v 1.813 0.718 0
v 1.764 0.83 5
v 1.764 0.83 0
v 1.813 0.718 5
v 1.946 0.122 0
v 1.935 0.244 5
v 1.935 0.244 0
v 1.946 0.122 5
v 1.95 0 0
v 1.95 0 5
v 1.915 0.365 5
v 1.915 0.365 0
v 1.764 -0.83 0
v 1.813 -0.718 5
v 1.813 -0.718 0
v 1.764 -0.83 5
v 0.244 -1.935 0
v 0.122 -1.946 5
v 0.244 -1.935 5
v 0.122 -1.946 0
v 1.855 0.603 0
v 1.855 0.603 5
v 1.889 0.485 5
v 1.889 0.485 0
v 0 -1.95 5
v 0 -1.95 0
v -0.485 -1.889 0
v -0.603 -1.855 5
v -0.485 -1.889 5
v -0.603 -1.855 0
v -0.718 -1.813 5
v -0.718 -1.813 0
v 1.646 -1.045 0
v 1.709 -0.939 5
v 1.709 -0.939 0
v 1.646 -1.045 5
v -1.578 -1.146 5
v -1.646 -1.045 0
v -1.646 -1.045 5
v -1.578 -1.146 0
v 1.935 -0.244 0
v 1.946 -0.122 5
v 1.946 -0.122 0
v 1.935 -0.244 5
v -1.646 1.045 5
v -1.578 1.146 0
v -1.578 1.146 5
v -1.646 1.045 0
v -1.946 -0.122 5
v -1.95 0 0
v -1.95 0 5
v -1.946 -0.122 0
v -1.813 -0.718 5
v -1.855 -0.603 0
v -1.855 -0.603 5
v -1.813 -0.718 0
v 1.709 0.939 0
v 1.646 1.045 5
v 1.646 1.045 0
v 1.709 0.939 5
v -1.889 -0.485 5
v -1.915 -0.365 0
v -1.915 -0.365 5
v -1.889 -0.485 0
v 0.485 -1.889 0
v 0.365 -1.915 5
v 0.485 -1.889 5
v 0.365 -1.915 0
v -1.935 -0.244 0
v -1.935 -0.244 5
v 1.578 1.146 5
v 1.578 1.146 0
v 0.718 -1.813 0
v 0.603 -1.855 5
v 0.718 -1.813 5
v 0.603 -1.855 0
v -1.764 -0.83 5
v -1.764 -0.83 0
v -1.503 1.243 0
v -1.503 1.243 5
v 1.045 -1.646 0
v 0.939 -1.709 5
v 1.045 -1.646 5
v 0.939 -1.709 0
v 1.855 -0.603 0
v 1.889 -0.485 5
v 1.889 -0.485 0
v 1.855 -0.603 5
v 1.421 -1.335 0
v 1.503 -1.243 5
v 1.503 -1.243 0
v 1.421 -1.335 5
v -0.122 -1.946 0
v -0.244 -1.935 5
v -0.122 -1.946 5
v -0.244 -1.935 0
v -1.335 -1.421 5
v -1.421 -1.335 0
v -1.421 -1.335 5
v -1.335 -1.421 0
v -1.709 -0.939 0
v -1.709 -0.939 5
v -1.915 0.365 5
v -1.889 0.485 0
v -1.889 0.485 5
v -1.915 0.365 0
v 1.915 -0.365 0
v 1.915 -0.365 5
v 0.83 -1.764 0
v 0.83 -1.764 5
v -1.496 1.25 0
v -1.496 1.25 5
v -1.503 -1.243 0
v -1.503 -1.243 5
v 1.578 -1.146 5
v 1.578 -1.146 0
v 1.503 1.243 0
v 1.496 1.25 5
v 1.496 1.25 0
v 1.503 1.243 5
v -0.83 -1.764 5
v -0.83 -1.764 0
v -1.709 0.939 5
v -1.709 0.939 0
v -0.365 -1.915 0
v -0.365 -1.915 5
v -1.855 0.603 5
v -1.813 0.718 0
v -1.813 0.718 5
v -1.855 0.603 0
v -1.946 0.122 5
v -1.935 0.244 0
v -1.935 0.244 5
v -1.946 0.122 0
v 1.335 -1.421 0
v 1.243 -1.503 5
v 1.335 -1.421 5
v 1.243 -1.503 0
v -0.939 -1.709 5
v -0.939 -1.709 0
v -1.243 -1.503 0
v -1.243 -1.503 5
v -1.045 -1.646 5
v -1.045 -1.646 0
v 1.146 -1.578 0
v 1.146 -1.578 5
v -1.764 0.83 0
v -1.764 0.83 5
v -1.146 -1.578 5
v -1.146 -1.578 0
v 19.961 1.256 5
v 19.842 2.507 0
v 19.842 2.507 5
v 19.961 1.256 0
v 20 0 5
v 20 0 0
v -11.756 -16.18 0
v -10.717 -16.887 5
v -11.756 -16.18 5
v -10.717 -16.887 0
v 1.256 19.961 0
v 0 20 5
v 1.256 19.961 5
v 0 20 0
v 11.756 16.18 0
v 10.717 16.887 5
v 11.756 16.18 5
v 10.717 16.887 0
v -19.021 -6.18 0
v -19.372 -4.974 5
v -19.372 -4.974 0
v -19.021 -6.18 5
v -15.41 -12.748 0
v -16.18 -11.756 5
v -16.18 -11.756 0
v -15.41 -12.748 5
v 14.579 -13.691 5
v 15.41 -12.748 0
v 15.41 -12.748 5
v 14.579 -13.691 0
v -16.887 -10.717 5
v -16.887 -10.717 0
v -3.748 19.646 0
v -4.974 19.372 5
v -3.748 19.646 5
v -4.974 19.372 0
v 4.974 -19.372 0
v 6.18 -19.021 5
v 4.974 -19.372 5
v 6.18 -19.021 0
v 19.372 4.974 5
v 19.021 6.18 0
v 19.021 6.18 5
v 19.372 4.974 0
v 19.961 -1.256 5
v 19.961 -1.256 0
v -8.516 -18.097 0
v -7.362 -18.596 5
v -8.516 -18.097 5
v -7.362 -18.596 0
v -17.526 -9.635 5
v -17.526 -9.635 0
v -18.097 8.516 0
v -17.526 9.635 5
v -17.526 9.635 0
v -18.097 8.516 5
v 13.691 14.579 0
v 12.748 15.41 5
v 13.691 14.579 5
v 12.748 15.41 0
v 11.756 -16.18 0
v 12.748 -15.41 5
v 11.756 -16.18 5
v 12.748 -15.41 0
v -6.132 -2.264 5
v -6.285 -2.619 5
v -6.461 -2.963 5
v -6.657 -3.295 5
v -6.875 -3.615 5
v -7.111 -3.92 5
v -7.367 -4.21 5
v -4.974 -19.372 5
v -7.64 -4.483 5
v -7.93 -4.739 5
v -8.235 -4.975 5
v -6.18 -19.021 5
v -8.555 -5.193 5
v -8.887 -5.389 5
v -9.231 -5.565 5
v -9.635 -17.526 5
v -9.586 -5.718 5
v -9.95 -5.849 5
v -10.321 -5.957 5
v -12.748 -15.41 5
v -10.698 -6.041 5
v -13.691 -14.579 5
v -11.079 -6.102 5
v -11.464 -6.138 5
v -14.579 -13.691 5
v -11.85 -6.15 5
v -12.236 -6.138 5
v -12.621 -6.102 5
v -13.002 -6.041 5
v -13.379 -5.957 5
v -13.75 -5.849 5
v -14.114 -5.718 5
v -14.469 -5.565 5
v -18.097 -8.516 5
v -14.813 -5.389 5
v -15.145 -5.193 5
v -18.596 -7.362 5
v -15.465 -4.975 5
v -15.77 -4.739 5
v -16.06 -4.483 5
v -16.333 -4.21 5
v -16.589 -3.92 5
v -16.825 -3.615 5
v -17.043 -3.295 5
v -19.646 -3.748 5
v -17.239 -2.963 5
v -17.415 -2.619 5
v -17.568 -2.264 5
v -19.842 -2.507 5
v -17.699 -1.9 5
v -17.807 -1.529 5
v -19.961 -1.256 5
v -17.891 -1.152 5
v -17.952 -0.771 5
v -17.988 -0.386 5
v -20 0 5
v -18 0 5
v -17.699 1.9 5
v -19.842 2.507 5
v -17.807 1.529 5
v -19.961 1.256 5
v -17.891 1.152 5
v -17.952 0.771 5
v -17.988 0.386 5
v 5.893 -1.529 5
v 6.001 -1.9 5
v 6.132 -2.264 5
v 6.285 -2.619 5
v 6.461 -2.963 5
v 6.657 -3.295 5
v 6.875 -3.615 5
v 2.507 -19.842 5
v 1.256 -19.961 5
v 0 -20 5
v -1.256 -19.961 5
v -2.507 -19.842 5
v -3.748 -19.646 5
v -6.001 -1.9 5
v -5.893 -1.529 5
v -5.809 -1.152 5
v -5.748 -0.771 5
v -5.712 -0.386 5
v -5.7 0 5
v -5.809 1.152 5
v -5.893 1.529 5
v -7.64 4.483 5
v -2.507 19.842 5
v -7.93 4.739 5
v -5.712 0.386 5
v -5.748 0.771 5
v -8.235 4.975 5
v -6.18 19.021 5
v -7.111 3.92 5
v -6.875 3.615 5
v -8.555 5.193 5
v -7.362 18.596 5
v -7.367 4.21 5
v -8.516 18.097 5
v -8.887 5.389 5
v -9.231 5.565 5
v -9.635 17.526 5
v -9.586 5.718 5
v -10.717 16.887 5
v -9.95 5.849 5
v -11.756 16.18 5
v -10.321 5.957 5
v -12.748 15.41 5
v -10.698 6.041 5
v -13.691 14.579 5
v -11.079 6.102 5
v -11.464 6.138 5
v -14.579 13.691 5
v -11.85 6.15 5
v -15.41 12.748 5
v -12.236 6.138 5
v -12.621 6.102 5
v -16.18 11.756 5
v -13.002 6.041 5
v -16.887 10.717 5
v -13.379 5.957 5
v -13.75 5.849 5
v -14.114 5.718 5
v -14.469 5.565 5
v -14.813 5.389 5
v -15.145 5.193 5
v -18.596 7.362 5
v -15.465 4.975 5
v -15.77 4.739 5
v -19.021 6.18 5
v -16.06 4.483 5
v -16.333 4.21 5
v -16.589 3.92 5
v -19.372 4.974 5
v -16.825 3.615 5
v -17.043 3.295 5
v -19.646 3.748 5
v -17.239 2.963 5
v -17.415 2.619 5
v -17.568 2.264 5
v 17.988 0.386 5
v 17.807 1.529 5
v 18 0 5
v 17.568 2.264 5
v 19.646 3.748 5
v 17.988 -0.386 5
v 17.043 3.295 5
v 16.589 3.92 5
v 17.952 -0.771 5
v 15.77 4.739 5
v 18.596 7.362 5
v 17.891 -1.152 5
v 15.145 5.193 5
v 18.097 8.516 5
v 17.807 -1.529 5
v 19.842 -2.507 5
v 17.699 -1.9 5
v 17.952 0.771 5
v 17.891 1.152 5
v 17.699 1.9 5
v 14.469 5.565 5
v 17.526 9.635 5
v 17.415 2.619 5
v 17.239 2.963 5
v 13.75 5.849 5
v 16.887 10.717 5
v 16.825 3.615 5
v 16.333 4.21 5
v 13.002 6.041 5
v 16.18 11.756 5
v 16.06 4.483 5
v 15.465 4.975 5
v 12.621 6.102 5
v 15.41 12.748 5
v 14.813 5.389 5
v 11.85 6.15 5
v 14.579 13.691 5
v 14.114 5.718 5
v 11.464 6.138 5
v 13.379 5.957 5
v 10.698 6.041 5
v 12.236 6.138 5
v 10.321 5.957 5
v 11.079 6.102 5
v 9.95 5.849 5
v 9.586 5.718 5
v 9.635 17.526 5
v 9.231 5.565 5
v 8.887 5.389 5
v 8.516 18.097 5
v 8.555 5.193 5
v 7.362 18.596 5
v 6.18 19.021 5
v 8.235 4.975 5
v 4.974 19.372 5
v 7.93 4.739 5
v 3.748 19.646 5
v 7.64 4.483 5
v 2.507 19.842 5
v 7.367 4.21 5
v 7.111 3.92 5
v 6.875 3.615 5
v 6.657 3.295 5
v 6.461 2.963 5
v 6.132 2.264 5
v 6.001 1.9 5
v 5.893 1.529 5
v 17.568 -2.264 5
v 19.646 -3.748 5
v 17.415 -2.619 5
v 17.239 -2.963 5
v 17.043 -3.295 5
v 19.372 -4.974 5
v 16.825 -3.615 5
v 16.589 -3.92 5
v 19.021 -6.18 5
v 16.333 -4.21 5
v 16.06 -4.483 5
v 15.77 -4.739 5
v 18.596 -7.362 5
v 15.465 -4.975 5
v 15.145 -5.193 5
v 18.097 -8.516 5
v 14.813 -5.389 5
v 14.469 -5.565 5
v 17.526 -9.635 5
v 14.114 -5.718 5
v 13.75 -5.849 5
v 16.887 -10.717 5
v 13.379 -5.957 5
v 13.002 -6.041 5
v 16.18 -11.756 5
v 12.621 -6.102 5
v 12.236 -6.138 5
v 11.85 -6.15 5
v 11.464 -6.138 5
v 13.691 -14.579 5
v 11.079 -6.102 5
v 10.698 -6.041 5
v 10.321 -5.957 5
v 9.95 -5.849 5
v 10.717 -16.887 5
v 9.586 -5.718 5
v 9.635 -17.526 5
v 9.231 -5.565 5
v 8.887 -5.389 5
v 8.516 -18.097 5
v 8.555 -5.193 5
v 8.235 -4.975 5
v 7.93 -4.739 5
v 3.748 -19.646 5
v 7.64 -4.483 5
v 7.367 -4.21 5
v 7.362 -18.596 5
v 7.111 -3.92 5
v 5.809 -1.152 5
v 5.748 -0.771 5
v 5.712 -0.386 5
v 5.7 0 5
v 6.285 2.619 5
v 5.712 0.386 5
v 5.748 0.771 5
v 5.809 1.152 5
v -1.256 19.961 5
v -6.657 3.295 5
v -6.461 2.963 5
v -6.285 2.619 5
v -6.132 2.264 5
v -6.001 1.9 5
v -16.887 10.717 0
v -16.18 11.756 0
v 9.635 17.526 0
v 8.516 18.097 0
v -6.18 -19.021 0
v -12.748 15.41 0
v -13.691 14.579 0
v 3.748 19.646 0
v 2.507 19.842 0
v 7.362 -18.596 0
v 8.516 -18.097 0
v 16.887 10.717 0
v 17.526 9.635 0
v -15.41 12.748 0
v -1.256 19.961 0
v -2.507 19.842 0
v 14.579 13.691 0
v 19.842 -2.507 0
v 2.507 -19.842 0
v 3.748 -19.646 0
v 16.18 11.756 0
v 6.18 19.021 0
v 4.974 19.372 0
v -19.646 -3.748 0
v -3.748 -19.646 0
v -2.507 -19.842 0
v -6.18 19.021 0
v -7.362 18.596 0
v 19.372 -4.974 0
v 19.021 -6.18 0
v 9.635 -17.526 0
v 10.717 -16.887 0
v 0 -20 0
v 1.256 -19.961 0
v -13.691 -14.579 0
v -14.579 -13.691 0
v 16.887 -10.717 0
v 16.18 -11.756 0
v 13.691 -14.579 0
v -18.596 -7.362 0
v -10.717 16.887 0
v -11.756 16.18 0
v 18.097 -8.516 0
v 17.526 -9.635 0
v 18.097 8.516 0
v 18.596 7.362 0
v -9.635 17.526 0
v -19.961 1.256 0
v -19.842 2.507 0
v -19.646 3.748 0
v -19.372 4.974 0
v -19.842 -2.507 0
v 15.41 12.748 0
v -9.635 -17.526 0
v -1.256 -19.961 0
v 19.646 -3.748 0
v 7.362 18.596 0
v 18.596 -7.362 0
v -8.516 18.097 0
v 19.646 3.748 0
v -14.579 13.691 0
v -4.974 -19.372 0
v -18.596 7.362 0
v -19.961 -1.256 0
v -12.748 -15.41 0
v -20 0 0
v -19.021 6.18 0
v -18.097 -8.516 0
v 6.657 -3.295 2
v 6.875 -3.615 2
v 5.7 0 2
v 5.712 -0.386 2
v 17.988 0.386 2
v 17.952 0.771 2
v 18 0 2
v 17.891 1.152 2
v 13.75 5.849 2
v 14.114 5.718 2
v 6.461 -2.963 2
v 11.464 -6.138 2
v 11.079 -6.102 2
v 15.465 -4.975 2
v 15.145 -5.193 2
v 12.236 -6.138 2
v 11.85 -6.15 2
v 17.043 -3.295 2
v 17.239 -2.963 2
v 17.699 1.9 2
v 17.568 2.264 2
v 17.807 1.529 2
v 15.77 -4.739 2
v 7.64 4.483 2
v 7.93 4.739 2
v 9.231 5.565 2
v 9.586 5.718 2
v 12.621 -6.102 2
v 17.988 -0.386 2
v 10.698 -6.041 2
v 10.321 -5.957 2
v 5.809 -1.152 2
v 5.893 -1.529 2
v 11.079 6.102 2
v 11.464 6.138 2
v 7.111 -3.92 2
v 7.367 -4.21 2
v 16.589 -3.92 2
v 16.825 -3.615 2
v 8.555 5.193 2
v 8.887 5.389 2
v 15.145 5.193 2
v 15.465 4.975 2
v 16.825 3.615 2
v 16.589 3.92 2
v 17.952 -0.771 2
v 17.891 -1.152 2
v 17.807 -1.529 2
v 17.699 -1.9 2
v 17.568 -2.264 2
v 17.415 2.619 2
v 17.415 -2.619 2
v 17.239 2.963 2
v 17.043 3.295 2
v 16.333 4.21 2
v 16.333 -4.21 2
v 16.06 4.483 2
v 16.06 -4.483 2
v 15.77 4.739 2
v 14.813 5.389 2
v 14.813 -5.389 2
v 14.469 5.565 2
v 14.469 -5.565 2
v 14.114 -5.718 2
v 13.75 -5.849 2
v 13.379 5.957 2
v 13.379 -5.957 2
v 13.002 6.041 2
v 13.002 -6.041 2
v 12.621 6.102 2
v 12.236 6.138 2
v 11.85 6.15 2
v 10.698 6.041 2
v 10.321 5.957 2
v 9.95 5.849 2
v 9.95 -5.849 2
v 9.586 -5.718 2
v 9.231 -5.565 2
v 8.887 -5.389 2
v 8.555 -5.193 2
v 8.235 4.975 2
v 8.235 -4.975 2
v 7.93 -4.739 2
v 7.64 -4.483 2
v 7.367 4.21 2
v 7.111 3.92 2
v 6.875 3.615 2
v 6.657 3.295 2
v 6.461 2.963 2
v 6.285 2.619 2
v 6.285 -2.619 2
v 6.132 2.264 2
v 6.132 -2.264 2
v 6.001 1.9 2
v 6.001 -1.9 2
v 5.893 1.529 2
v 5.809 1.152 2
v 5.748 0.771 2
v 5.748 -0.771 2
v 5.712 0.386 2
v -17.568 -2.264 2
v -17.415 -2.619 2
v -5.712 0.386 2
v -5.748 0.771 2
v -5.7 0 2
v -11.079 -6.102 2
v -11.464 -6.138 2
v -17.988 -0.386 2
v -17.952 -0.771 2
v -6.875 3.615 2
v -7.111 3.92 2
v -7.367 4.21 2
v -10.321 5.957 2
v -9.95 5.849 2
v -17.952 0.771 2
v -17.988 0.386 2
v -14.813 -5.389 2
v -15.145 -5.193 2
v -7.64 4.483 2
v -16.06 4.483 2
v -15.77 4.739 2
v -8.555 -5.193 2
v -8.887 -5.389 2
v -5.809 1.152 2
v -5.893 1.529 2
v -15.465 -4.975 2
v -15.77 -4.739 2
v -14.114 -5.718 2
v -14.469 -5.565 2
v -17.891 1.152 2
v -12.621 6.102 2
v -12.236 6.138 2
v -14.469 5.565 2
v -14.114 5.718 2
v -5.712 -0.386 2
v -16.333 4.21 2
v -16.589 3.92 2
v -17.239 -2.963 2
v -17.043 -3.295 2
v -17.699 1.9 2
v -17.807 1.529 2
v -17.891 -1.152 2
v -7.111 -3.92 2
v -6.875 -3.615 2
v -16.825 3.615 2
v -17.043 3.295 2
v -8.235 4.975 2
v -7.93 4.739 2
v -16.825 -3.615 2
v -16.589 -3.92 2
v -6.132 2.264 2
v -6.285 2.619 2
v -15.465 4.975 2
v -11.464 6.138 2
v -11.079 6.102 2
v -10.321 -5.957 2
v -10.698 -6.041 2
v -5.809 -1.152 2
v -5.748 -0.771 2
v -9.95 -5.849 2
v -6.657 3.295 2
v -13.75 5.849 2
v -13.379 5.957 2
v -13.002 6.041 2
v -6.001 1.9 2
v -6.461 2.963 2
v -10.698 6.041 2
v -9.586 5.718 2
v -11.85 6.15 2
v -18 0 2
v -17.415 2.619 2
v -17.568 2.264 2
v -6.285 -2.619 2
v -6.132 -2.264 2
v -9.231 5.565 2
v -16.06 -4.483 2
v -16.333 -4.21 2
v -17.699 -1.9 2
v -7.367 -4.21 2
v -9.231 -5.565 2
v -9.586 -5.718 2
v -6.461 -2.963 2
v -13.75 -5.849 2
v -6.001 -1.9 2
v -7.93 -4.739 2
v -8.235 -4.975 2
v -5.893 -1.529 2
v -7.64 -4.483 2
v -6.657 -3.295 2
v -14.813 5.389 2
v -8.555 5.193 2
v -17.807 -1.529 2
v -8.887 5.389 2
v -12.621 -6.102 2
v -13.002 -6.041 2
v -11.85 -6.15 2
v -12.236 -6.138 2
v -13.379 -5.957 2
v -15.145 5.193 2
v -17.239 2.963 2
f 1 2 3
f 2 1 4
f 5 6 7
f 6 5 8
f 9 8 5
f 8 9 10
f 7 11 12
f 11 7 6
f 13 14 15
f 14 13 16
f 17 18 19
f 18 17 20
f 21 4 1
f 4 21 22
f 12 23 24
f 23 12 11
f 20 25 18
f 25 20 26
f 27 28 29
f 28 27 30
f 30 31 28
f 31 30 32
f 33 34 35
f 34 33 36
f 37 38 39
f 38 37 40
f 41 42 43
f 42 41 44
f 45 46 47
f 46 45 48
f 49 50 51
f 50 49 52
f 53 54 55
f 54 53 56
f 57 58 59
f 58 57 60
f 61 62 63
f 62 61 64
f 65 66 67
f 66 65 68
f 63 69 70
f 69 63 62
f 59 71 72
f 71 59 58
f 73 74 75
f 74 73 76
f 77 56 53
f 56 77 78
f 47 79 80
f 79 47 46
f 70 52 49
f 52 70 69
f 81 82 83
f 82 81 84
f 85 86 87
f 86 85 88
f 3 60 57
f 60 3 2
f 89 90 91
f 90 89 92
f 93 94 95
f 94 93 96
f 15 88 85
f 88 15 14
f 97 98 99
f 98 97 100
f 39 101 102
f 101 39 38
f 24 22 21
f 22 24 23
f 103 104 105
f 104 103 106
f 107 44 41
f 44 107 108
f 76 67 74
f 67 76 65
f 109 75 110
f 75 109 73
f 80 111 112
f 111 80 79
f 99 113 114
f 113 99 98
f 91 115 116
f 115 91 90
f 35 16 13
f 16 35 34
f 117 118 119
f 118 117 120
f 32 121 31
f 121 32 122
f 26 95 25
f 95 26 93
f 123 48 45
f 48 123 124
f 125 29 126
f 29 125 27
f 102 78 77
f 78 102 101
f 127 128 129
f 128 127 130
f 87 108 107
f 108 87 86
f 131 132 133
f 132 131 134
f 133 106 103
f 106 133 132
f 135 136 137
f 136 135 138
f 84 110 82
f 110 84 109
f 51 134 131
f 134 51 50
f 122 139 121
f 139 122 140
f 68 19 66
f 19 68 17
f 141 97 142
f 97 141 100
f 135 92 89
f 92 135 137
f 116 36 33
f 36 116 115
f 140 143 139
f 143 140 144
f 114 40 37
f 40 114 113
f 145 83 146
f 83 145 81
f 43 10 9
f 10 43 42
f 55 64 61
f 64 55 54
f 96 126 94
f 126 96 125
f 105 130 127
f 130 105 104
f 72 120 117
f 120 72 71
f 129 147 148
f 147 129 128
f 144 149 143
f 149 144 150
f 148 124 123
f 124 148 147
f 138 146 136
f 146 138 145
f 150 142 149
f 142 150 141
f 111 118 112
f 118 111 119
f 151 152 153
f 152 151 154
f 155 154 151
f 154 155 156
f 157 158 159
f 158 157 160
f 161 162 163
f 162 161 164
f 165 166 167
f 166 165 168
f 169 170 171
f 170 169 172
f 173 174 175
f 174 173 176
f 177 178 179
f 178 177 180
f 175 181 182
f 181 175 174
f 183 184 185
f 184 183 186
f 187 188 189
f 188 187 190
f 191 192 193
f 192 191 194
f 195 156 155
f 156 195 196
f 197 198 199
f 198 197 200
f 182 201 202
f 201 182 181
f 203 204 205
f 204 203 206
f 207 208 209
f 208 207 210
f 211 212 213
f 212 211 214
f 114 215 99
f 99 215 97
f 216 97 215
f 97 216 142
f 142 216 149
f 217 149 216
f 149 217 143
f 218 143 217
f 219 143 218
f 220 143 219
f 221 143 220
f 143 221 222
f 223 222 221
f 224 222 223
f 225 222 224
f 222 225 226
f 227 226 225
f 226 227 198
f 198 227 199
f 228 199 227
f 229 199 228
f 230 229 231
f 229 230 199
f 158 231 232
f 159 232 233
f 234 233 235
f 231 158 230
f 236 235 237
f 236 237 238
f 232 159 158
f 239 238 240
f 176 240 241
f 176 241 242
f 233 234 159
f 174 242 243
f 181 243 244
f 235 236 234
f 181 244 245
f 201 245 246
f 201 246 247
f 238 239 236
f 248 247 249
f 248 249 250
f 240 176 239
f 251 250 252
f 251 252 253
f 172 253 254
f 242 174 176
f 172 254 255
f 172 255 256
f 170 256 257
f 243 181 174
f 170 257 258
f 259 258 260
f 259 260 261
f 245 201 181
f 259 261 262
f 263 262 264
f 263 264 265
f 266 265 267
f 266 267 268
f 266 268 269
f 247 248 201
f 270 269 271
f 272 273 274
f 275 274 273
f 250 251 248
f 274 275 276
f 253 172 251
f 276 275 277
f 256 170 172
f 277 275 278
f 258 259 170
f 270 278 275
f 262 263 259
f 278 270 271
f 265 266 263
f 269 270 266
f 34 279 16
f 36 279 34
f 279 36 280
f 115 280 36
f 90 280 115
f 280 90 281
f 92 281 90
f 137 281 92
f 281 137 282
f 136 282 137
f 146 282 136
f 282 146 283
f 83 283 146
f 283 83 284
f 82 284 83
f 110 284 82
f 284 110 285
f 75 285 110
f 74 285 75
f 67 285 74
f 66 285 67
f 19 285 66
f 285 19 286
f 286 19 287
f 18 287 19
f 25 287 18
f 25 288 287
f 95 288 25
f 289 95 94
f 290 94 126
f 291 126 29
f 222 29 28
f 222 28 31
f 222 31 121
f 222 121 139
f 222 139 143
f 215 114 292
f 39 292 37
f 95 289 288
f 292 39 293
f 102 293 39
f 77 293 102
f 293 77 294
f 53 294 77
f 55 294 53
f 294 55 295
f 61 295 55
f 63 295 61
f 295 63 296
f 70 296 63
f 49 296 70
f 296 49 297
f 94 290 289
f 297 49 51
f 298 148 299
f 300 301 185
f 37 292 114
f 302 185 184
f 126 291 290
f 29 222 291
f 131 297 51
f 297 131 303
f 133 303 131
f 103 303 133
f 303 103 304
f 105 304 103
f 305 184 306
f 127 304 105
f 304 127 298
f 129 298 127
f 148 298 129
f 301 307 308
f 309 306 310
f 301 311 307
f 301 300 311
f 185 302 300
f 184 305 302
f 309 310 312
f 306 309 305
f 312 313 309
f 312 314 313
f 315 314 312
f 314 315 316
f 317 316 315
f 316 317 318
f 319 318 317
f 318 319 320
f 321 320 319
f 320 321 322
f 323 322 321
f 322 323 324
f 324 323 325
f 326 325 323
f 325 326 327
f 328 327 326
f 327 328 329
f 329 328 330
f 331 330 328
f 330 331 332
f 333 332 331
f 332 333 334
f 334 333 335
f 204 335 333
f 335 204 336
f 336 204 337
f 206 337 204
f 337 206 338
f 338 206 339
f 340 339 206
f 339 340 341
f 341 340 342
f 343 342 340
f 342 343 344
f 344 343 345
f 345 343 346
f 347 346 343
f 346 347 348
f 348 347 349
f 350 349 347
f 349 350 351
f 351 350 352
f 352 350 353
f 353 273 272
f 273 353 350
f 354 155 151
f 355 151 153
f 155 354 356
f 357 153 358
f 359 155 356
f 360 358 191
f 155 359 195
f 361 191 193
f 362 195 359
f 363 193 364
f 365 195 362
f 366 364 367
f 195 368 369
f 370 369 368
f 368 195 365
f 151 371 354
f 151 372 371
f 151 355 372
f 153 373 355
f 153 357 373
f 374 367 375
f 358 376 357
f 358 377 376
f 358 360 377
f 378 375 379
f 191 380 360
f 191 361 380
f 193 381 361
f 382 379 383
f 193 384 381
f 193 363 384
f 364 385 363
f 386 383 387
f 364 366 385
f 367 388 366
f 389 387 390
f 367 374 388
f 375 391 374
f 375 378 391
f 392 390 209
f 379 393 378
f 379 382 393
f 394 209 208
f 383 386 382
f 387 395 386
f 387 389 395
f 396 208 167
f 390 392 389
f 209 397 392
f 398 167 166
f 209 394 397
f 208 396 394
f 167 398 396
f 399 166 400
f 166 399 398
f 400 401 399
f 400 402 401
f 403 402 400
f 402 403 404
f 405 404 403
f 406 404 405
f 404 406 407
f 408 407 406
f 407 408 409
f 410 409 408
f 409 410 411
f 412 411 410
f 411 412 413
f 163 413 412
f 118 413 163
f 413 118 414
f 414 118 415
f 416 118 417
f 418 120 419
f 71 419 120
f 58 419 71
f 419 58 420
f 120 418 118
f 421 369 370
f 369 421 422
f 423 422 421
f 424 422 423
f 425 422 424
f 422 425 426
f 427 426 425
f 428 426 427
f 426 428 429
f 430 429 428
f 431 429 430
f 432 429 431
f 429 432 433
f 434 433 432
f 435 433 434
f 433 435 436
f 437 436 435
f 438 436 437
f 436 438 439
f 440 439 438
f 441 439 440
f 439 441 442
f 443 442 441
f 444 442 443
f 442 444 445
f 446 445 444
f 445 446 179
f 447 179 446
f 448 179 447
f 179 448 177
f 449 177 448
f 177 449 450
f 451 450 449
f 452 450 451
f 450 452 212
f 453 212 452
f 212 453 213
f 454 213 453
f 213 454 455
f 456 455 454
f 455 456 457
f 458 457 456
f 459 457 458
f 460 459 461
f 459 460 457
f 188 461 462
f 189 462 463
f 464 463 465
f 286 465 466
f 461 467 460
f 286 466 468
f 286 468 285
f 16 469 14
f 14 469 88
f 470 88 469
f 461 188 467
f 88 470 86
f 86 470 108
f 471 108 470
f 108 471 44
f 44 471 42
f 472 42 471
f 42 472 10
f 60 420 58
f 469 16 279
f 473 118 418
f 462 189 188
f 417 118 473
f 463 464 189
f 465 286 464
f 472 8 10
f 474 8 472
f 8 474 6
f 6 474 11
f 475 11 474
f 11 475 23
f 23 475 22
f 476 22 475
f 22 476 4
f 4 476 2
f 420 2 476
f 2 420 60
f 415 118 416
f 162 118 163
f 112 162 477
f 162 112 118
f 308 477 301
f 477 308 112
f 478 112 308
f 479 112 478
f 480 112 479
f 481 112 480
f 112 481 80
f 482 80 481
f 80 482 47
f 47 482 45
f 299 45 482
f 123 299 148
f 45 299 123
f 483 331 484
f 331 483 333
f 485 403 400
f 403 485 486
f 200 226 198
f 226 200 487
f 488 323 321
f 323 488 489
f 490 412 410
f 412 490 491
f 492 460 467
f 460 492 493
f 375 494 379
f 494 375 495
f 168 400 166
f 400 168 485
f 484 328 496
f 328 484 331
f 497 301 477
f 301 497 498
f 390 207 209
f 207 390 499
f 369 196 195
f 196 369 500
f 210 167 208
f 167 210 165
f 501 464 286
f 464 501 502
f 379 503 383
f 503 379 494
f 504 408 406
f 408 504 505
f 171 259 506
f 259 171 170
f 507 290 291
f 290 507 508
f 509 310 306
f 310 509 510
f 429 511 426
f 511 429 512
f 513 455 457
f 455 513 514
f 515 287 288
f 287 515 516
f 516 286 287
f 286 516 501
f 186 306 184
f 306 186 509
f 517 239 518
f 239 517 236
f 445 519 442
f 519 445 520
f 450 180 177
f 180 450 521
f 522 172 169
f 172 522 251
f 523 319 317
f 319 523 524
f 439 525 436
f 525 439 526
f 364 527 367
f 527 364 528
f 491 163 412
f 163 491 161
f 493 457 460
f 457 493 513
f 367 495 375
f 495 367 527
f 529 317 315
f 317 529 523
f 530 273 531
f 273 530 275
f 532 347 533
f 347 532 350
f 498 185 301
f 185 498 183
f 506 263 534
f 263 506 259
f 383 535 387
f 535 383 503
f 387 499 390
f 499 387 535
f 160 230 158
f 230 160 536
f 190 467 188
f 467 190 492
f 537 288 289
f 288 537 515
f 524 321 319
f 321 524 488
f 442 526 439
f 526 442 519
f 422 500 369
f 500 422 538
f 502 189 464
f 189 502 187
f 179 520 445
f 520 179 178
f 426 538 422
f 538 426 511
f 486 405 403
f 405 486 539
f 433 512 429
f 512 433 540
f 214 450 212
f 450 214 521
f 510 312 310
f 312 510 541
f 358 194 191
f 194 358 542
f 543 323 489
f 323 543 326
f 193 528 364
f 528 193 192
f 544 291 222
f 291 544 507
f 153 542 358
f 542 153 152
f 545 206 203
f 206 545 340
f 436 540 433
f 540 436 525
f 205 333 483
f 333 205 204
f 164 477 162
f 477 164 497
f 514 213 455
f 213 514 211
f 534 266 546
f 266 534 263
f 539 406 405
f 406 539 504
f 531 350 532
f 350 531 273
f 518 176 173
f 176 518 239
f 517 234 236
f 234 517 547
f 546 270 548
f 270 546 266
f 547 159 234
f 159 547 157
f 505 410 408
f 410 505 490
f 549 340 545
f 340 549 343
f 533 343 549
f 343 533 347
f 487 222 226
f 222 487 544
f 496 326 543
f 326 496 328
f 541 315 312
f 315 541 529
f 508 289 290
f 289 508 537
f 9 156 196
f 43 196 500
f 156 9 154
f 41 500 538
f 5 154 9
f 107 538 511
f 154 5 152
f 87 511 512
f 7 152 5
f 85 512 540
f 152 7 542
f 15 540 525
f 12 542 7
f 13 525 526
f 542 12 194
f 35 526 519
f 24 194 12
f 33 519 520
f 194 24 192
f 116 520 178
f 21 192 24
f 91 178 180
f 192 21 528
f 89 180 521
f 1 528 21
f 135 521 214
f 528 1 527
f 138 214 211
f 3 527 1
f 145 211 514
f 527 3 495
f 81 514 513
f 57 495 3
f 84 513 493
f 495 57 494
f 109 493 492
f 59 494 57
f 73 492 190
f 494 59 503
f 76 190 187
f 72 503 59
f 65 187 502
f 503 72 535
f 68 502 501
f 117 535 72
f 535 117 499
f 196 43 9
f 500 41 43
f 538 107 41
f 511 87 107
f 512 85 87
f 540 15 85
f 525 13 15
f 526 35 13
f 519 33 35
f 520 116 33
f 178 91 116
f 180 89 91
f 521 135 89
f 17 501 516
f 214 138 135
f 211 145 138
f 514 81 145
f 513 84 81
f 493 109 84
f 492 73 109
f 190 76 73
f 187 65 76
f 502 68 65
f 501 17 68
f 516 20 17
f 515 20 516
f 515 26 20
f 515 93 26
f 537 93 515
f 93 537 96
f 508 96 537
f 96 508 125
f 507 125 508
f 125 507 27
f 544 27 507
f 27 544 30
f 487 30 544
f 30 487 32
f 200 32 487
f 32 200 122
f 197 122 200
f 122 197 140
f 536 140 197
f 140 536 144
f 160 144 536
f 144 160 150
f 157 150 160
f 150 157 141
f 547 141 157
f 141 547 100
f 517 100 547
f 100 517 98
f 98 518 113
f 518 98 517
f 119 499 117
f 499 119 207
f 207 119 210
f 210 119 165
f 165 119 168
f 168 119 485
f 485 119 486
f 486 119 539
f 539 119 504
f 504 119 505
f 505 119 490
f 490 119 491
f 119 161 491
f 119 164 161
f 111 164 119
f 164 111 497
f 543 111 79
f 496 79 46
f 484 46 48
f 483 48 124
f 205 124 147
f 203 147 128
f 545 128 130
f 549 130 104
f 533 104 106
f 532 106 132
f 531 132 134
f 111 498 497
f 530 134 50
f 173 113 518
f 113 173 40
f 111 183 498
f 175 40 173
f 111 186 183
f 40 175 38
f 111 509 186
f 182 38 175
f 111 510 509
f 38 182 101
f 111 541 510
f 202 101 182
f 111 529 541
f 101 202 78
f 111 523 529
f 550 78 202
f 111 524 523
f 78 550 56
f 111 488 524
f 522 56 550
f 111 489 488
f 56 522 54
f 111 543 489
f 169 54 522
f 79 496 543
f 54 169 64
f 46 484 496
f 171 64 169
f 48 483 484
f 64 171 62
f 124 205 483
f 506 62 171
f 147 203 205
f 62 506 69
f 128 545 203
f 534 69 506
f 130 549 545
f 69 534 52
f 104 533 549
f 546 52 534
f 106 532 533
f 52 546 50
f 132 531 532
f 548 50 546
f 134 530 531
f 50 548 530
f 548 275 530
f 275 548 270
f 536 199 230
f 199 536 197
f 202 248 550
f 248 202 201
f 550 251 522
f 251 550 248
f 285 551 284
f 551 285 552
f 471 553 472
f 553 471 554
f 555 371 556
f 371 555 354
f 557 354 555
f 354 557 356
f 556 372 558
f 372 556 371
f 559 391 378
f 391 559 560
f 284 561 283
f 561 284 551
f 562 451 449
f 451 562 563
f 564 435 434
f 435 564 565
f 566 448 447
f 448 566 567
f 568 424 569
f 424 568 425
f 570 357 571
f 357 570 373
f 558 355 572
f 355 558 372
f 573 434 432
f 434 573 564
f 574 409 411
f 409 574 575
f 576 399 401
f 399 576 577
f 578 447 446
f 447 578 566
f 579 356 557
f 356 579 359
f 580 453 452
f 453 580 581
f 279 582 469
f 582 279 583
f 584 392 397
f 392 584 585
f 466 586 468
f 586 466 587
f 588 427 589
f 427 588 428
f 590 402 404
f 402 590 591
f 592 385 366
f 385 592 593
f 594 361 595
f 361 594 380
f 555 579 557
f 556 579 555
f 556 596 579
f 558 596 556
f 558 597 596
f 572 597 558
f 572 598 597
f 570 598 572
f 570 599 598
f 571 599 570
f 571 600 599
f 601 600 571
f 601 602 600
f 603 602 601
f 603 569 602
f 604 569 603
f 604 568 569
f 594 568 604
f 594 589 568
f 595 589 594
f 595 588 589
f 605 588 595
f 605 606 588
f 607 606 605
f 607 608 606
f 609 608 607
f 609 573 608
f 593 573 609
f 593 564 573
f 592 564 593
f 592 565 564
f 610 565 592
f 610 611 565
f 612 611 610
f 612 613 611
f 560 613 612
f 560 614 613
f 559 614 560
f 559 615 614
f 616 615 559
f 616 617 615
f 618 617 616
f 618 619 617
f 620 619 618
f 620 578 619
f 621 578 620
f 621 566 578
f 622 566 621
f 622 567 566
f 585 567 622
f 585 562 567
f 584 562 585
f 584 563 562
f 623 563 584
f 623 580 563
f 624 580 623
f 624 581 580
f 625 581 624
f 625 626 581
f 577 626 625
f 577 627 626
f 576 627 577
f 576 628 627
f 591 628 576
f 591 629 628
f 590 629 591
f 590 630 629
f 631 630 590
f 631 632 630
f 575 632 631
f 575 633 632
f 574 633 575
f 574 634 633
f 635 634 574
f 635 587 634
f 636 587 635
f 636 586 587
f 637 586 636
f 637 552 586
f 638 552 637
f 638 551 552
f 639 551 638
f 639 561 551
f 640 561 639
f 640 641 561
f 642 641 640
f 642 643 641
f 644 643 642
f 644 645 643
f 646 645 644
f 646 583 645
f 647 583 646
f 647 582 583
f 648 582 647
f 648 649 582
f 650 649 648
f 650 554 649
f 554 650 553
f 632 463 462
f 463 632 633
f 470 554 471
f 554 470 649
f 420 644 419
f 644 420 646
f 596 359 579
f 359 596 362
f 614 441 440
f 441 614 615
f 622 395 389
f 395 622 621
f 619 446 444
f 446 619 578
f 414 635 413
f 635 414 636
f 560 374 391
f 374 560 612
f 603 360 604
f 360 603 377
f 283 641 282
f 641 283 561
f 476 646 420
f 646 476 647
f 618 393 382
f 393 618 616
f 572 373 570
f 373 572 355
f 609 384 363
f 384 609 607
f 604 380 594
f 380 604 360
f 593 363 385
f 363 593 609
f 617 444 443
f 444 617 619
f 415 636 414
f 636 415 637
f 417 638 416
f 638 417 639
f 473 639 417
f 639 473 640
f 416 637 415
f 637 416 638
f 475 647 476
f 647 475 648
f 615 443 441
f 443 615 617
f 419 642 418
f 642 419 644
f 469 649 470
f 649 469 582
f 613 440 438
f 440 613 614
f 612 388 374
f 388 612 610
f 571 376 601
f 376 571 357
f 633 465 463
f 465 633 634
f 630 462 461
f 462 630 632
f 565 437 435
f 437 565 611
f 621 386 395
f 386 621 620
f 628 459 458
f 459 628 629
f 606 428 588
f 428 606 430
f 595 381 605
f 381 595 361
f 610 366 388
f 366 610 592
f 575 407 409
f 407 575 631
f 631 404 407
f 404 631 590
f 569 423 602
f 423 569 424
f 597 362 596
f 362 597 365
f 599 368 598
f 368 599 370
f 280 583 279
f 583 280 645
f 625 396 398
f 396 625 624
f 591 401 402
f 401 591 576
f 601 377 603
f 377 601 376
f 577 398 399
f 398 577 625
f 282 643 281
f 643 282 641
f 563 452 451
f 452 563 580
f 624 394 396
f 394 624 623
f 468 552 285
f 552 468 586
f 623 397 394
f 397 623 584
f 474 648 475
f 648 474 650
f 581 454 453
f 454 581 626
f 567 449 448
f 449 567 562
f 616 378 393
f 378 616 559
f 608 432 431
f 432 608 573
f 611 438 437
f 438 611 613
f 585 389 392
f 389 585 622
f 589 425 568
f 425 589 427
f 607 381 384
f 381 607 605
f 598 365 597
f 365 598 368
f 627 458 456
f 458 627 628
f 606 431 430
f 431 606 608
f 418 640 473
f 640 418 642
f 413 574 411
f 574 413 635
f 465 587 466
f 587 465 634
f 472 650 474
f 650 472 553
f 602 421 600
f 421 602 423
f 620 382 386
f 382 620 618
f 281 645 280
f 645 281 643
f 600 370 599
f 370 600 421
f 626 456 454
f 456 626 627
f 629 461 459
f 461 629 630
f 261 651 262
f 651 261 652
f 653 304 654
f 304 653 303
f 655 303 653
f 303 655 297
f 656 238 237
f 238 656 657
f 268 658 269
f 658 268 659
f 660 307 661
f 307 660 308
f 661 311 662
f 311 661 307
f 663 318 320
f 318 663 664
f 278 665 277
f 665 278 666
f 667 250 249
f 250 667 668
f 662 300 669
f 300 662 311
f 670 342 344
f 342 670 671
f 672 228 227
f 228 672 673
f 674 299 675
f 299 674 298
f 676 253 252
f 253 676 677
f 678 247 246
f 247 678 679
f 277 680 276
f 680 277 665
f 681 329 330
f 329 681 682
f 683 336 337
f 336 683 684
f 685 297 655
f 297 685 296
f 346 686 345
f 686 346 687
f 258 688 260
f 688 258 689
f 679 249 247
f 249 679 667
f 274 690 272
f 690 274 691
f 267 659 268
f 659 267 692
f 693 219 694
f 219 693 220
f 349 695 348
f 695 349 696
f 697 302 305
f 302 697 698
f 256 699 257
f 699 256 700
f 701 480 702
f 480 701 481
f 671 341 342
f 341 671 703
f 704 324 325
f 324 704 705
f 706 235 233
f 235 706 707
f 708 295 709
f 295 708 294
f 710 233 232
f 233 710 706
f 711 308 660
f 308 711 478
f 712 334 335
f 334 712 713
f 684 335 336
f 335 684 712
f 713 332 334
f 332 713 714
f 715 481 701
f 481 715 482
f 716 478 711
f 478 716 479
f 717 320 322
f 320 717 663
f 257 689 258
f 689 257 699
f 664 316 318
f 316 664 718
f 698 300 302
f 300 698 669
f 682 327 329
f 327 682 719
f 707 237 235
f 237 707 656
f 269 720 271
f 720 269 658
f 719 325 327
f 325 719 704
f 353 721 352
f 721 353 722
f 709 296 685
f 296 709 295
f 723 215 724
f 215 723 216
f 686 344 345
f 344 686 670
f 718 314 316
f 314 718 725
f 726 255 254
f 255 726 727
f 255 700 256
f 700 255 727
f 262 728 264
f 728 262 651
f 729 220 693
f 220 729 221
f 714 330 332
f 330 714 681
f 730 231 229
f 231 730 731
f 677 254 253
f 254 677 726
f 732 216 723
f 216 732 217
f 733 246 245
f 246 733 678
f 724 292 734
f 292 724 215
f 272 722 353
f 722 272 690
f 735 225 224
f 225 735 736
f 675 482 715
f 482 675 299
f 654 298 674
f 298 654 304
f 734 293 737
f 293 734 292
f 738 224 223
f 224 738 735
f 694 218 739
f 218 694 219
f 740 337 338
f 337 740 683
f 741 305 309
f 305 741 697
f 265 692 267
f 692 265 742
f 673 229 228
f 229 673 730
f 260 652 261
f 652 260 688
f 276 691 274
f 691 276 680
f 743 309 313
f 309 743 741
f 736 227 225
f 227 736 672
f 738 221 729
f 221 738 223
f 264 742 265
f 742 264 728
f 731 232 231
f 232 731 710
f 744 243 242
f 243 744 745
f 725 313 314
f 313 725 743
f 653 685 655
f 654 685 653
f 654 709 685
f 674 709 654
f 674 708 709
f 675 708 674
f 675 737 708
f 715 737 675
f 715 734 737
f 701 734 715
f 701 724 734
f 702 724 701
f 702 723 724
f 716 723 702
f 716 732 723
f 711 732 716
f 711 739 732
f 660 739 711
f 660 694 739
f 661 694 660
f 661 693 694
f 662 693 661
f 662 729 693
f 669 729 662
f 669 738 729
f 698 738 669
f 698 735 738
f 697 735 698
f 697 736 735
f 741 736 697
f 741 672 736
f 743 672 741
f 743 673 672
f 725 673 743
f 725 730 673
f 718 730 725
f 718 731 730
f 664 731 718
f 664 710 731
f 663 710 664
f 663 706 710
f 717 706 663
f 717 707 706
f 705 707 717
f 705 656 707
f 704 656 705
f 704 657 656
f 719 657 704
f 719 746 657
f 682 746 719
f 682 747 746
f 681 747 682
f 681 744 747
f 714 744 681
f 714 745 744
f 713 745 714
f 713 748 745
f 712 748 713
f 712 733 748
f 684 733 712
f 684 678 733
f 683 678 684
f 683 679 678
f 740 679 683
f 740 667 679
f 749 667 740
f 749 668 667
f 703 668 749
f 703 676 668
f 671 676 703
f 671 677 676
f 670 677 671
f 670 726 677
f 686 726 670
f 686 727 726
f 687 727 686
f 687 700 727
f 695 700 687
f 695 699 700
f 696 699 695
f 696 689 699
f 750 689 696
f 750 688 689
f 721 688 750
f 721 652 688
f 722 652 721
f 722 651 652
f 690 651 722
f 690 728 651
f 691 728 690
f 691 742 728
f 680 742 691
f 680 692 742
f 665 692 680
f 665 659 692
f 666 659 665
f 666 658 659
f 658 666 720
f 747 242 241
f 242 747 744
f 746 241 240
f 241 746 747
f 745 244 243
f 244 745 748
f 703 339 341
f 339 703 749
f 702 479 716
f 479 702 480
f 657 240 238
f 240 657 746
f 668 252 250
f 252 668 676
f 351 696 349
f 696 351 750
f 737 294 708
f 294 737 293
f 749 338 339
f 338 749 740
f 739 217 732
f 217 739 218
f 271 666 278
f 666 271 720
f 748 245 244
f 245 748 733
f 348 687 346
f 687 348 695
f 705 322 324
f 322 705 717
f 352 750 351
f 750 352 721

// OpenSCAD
$fn=100;

plate_width = 40;
plate_height = 5;

magnet_slot_width = 12.3;
magnet_slot_height = 3;
magnet_slot_edge = 2;

pw = 3.9;     // pin width
pi = 0.7;    // pin indent

head();

module pin_hole() {
    difference() {
        cylinder(h=plate_height+2, r=pw/2);
        translate([-pw/2,pw/2-pi,-1]) cube([pw, pi, plate_height+4]);
    }
}


module head() {
    difference() {
        cylinder(h=plate_height, r=plate_width/2);
        translate([plate_width/2-magnet_slot_width/2-magnet_slot_edge,0,plate_height-magnet_slot_height]) cylinder(h=magnet_slot_height+1, r=magnet_slot_width/2);
        translate([-(plate_width/2-magnet_slot_width/2-magnet_slot_edge),0,plate_height-magnet_slot_height]) cylinder(h=magnet_slot_height+1, r=magnet_slot_width/2);
        #translate([0,0,-1]) pin_hole();
    }
}
